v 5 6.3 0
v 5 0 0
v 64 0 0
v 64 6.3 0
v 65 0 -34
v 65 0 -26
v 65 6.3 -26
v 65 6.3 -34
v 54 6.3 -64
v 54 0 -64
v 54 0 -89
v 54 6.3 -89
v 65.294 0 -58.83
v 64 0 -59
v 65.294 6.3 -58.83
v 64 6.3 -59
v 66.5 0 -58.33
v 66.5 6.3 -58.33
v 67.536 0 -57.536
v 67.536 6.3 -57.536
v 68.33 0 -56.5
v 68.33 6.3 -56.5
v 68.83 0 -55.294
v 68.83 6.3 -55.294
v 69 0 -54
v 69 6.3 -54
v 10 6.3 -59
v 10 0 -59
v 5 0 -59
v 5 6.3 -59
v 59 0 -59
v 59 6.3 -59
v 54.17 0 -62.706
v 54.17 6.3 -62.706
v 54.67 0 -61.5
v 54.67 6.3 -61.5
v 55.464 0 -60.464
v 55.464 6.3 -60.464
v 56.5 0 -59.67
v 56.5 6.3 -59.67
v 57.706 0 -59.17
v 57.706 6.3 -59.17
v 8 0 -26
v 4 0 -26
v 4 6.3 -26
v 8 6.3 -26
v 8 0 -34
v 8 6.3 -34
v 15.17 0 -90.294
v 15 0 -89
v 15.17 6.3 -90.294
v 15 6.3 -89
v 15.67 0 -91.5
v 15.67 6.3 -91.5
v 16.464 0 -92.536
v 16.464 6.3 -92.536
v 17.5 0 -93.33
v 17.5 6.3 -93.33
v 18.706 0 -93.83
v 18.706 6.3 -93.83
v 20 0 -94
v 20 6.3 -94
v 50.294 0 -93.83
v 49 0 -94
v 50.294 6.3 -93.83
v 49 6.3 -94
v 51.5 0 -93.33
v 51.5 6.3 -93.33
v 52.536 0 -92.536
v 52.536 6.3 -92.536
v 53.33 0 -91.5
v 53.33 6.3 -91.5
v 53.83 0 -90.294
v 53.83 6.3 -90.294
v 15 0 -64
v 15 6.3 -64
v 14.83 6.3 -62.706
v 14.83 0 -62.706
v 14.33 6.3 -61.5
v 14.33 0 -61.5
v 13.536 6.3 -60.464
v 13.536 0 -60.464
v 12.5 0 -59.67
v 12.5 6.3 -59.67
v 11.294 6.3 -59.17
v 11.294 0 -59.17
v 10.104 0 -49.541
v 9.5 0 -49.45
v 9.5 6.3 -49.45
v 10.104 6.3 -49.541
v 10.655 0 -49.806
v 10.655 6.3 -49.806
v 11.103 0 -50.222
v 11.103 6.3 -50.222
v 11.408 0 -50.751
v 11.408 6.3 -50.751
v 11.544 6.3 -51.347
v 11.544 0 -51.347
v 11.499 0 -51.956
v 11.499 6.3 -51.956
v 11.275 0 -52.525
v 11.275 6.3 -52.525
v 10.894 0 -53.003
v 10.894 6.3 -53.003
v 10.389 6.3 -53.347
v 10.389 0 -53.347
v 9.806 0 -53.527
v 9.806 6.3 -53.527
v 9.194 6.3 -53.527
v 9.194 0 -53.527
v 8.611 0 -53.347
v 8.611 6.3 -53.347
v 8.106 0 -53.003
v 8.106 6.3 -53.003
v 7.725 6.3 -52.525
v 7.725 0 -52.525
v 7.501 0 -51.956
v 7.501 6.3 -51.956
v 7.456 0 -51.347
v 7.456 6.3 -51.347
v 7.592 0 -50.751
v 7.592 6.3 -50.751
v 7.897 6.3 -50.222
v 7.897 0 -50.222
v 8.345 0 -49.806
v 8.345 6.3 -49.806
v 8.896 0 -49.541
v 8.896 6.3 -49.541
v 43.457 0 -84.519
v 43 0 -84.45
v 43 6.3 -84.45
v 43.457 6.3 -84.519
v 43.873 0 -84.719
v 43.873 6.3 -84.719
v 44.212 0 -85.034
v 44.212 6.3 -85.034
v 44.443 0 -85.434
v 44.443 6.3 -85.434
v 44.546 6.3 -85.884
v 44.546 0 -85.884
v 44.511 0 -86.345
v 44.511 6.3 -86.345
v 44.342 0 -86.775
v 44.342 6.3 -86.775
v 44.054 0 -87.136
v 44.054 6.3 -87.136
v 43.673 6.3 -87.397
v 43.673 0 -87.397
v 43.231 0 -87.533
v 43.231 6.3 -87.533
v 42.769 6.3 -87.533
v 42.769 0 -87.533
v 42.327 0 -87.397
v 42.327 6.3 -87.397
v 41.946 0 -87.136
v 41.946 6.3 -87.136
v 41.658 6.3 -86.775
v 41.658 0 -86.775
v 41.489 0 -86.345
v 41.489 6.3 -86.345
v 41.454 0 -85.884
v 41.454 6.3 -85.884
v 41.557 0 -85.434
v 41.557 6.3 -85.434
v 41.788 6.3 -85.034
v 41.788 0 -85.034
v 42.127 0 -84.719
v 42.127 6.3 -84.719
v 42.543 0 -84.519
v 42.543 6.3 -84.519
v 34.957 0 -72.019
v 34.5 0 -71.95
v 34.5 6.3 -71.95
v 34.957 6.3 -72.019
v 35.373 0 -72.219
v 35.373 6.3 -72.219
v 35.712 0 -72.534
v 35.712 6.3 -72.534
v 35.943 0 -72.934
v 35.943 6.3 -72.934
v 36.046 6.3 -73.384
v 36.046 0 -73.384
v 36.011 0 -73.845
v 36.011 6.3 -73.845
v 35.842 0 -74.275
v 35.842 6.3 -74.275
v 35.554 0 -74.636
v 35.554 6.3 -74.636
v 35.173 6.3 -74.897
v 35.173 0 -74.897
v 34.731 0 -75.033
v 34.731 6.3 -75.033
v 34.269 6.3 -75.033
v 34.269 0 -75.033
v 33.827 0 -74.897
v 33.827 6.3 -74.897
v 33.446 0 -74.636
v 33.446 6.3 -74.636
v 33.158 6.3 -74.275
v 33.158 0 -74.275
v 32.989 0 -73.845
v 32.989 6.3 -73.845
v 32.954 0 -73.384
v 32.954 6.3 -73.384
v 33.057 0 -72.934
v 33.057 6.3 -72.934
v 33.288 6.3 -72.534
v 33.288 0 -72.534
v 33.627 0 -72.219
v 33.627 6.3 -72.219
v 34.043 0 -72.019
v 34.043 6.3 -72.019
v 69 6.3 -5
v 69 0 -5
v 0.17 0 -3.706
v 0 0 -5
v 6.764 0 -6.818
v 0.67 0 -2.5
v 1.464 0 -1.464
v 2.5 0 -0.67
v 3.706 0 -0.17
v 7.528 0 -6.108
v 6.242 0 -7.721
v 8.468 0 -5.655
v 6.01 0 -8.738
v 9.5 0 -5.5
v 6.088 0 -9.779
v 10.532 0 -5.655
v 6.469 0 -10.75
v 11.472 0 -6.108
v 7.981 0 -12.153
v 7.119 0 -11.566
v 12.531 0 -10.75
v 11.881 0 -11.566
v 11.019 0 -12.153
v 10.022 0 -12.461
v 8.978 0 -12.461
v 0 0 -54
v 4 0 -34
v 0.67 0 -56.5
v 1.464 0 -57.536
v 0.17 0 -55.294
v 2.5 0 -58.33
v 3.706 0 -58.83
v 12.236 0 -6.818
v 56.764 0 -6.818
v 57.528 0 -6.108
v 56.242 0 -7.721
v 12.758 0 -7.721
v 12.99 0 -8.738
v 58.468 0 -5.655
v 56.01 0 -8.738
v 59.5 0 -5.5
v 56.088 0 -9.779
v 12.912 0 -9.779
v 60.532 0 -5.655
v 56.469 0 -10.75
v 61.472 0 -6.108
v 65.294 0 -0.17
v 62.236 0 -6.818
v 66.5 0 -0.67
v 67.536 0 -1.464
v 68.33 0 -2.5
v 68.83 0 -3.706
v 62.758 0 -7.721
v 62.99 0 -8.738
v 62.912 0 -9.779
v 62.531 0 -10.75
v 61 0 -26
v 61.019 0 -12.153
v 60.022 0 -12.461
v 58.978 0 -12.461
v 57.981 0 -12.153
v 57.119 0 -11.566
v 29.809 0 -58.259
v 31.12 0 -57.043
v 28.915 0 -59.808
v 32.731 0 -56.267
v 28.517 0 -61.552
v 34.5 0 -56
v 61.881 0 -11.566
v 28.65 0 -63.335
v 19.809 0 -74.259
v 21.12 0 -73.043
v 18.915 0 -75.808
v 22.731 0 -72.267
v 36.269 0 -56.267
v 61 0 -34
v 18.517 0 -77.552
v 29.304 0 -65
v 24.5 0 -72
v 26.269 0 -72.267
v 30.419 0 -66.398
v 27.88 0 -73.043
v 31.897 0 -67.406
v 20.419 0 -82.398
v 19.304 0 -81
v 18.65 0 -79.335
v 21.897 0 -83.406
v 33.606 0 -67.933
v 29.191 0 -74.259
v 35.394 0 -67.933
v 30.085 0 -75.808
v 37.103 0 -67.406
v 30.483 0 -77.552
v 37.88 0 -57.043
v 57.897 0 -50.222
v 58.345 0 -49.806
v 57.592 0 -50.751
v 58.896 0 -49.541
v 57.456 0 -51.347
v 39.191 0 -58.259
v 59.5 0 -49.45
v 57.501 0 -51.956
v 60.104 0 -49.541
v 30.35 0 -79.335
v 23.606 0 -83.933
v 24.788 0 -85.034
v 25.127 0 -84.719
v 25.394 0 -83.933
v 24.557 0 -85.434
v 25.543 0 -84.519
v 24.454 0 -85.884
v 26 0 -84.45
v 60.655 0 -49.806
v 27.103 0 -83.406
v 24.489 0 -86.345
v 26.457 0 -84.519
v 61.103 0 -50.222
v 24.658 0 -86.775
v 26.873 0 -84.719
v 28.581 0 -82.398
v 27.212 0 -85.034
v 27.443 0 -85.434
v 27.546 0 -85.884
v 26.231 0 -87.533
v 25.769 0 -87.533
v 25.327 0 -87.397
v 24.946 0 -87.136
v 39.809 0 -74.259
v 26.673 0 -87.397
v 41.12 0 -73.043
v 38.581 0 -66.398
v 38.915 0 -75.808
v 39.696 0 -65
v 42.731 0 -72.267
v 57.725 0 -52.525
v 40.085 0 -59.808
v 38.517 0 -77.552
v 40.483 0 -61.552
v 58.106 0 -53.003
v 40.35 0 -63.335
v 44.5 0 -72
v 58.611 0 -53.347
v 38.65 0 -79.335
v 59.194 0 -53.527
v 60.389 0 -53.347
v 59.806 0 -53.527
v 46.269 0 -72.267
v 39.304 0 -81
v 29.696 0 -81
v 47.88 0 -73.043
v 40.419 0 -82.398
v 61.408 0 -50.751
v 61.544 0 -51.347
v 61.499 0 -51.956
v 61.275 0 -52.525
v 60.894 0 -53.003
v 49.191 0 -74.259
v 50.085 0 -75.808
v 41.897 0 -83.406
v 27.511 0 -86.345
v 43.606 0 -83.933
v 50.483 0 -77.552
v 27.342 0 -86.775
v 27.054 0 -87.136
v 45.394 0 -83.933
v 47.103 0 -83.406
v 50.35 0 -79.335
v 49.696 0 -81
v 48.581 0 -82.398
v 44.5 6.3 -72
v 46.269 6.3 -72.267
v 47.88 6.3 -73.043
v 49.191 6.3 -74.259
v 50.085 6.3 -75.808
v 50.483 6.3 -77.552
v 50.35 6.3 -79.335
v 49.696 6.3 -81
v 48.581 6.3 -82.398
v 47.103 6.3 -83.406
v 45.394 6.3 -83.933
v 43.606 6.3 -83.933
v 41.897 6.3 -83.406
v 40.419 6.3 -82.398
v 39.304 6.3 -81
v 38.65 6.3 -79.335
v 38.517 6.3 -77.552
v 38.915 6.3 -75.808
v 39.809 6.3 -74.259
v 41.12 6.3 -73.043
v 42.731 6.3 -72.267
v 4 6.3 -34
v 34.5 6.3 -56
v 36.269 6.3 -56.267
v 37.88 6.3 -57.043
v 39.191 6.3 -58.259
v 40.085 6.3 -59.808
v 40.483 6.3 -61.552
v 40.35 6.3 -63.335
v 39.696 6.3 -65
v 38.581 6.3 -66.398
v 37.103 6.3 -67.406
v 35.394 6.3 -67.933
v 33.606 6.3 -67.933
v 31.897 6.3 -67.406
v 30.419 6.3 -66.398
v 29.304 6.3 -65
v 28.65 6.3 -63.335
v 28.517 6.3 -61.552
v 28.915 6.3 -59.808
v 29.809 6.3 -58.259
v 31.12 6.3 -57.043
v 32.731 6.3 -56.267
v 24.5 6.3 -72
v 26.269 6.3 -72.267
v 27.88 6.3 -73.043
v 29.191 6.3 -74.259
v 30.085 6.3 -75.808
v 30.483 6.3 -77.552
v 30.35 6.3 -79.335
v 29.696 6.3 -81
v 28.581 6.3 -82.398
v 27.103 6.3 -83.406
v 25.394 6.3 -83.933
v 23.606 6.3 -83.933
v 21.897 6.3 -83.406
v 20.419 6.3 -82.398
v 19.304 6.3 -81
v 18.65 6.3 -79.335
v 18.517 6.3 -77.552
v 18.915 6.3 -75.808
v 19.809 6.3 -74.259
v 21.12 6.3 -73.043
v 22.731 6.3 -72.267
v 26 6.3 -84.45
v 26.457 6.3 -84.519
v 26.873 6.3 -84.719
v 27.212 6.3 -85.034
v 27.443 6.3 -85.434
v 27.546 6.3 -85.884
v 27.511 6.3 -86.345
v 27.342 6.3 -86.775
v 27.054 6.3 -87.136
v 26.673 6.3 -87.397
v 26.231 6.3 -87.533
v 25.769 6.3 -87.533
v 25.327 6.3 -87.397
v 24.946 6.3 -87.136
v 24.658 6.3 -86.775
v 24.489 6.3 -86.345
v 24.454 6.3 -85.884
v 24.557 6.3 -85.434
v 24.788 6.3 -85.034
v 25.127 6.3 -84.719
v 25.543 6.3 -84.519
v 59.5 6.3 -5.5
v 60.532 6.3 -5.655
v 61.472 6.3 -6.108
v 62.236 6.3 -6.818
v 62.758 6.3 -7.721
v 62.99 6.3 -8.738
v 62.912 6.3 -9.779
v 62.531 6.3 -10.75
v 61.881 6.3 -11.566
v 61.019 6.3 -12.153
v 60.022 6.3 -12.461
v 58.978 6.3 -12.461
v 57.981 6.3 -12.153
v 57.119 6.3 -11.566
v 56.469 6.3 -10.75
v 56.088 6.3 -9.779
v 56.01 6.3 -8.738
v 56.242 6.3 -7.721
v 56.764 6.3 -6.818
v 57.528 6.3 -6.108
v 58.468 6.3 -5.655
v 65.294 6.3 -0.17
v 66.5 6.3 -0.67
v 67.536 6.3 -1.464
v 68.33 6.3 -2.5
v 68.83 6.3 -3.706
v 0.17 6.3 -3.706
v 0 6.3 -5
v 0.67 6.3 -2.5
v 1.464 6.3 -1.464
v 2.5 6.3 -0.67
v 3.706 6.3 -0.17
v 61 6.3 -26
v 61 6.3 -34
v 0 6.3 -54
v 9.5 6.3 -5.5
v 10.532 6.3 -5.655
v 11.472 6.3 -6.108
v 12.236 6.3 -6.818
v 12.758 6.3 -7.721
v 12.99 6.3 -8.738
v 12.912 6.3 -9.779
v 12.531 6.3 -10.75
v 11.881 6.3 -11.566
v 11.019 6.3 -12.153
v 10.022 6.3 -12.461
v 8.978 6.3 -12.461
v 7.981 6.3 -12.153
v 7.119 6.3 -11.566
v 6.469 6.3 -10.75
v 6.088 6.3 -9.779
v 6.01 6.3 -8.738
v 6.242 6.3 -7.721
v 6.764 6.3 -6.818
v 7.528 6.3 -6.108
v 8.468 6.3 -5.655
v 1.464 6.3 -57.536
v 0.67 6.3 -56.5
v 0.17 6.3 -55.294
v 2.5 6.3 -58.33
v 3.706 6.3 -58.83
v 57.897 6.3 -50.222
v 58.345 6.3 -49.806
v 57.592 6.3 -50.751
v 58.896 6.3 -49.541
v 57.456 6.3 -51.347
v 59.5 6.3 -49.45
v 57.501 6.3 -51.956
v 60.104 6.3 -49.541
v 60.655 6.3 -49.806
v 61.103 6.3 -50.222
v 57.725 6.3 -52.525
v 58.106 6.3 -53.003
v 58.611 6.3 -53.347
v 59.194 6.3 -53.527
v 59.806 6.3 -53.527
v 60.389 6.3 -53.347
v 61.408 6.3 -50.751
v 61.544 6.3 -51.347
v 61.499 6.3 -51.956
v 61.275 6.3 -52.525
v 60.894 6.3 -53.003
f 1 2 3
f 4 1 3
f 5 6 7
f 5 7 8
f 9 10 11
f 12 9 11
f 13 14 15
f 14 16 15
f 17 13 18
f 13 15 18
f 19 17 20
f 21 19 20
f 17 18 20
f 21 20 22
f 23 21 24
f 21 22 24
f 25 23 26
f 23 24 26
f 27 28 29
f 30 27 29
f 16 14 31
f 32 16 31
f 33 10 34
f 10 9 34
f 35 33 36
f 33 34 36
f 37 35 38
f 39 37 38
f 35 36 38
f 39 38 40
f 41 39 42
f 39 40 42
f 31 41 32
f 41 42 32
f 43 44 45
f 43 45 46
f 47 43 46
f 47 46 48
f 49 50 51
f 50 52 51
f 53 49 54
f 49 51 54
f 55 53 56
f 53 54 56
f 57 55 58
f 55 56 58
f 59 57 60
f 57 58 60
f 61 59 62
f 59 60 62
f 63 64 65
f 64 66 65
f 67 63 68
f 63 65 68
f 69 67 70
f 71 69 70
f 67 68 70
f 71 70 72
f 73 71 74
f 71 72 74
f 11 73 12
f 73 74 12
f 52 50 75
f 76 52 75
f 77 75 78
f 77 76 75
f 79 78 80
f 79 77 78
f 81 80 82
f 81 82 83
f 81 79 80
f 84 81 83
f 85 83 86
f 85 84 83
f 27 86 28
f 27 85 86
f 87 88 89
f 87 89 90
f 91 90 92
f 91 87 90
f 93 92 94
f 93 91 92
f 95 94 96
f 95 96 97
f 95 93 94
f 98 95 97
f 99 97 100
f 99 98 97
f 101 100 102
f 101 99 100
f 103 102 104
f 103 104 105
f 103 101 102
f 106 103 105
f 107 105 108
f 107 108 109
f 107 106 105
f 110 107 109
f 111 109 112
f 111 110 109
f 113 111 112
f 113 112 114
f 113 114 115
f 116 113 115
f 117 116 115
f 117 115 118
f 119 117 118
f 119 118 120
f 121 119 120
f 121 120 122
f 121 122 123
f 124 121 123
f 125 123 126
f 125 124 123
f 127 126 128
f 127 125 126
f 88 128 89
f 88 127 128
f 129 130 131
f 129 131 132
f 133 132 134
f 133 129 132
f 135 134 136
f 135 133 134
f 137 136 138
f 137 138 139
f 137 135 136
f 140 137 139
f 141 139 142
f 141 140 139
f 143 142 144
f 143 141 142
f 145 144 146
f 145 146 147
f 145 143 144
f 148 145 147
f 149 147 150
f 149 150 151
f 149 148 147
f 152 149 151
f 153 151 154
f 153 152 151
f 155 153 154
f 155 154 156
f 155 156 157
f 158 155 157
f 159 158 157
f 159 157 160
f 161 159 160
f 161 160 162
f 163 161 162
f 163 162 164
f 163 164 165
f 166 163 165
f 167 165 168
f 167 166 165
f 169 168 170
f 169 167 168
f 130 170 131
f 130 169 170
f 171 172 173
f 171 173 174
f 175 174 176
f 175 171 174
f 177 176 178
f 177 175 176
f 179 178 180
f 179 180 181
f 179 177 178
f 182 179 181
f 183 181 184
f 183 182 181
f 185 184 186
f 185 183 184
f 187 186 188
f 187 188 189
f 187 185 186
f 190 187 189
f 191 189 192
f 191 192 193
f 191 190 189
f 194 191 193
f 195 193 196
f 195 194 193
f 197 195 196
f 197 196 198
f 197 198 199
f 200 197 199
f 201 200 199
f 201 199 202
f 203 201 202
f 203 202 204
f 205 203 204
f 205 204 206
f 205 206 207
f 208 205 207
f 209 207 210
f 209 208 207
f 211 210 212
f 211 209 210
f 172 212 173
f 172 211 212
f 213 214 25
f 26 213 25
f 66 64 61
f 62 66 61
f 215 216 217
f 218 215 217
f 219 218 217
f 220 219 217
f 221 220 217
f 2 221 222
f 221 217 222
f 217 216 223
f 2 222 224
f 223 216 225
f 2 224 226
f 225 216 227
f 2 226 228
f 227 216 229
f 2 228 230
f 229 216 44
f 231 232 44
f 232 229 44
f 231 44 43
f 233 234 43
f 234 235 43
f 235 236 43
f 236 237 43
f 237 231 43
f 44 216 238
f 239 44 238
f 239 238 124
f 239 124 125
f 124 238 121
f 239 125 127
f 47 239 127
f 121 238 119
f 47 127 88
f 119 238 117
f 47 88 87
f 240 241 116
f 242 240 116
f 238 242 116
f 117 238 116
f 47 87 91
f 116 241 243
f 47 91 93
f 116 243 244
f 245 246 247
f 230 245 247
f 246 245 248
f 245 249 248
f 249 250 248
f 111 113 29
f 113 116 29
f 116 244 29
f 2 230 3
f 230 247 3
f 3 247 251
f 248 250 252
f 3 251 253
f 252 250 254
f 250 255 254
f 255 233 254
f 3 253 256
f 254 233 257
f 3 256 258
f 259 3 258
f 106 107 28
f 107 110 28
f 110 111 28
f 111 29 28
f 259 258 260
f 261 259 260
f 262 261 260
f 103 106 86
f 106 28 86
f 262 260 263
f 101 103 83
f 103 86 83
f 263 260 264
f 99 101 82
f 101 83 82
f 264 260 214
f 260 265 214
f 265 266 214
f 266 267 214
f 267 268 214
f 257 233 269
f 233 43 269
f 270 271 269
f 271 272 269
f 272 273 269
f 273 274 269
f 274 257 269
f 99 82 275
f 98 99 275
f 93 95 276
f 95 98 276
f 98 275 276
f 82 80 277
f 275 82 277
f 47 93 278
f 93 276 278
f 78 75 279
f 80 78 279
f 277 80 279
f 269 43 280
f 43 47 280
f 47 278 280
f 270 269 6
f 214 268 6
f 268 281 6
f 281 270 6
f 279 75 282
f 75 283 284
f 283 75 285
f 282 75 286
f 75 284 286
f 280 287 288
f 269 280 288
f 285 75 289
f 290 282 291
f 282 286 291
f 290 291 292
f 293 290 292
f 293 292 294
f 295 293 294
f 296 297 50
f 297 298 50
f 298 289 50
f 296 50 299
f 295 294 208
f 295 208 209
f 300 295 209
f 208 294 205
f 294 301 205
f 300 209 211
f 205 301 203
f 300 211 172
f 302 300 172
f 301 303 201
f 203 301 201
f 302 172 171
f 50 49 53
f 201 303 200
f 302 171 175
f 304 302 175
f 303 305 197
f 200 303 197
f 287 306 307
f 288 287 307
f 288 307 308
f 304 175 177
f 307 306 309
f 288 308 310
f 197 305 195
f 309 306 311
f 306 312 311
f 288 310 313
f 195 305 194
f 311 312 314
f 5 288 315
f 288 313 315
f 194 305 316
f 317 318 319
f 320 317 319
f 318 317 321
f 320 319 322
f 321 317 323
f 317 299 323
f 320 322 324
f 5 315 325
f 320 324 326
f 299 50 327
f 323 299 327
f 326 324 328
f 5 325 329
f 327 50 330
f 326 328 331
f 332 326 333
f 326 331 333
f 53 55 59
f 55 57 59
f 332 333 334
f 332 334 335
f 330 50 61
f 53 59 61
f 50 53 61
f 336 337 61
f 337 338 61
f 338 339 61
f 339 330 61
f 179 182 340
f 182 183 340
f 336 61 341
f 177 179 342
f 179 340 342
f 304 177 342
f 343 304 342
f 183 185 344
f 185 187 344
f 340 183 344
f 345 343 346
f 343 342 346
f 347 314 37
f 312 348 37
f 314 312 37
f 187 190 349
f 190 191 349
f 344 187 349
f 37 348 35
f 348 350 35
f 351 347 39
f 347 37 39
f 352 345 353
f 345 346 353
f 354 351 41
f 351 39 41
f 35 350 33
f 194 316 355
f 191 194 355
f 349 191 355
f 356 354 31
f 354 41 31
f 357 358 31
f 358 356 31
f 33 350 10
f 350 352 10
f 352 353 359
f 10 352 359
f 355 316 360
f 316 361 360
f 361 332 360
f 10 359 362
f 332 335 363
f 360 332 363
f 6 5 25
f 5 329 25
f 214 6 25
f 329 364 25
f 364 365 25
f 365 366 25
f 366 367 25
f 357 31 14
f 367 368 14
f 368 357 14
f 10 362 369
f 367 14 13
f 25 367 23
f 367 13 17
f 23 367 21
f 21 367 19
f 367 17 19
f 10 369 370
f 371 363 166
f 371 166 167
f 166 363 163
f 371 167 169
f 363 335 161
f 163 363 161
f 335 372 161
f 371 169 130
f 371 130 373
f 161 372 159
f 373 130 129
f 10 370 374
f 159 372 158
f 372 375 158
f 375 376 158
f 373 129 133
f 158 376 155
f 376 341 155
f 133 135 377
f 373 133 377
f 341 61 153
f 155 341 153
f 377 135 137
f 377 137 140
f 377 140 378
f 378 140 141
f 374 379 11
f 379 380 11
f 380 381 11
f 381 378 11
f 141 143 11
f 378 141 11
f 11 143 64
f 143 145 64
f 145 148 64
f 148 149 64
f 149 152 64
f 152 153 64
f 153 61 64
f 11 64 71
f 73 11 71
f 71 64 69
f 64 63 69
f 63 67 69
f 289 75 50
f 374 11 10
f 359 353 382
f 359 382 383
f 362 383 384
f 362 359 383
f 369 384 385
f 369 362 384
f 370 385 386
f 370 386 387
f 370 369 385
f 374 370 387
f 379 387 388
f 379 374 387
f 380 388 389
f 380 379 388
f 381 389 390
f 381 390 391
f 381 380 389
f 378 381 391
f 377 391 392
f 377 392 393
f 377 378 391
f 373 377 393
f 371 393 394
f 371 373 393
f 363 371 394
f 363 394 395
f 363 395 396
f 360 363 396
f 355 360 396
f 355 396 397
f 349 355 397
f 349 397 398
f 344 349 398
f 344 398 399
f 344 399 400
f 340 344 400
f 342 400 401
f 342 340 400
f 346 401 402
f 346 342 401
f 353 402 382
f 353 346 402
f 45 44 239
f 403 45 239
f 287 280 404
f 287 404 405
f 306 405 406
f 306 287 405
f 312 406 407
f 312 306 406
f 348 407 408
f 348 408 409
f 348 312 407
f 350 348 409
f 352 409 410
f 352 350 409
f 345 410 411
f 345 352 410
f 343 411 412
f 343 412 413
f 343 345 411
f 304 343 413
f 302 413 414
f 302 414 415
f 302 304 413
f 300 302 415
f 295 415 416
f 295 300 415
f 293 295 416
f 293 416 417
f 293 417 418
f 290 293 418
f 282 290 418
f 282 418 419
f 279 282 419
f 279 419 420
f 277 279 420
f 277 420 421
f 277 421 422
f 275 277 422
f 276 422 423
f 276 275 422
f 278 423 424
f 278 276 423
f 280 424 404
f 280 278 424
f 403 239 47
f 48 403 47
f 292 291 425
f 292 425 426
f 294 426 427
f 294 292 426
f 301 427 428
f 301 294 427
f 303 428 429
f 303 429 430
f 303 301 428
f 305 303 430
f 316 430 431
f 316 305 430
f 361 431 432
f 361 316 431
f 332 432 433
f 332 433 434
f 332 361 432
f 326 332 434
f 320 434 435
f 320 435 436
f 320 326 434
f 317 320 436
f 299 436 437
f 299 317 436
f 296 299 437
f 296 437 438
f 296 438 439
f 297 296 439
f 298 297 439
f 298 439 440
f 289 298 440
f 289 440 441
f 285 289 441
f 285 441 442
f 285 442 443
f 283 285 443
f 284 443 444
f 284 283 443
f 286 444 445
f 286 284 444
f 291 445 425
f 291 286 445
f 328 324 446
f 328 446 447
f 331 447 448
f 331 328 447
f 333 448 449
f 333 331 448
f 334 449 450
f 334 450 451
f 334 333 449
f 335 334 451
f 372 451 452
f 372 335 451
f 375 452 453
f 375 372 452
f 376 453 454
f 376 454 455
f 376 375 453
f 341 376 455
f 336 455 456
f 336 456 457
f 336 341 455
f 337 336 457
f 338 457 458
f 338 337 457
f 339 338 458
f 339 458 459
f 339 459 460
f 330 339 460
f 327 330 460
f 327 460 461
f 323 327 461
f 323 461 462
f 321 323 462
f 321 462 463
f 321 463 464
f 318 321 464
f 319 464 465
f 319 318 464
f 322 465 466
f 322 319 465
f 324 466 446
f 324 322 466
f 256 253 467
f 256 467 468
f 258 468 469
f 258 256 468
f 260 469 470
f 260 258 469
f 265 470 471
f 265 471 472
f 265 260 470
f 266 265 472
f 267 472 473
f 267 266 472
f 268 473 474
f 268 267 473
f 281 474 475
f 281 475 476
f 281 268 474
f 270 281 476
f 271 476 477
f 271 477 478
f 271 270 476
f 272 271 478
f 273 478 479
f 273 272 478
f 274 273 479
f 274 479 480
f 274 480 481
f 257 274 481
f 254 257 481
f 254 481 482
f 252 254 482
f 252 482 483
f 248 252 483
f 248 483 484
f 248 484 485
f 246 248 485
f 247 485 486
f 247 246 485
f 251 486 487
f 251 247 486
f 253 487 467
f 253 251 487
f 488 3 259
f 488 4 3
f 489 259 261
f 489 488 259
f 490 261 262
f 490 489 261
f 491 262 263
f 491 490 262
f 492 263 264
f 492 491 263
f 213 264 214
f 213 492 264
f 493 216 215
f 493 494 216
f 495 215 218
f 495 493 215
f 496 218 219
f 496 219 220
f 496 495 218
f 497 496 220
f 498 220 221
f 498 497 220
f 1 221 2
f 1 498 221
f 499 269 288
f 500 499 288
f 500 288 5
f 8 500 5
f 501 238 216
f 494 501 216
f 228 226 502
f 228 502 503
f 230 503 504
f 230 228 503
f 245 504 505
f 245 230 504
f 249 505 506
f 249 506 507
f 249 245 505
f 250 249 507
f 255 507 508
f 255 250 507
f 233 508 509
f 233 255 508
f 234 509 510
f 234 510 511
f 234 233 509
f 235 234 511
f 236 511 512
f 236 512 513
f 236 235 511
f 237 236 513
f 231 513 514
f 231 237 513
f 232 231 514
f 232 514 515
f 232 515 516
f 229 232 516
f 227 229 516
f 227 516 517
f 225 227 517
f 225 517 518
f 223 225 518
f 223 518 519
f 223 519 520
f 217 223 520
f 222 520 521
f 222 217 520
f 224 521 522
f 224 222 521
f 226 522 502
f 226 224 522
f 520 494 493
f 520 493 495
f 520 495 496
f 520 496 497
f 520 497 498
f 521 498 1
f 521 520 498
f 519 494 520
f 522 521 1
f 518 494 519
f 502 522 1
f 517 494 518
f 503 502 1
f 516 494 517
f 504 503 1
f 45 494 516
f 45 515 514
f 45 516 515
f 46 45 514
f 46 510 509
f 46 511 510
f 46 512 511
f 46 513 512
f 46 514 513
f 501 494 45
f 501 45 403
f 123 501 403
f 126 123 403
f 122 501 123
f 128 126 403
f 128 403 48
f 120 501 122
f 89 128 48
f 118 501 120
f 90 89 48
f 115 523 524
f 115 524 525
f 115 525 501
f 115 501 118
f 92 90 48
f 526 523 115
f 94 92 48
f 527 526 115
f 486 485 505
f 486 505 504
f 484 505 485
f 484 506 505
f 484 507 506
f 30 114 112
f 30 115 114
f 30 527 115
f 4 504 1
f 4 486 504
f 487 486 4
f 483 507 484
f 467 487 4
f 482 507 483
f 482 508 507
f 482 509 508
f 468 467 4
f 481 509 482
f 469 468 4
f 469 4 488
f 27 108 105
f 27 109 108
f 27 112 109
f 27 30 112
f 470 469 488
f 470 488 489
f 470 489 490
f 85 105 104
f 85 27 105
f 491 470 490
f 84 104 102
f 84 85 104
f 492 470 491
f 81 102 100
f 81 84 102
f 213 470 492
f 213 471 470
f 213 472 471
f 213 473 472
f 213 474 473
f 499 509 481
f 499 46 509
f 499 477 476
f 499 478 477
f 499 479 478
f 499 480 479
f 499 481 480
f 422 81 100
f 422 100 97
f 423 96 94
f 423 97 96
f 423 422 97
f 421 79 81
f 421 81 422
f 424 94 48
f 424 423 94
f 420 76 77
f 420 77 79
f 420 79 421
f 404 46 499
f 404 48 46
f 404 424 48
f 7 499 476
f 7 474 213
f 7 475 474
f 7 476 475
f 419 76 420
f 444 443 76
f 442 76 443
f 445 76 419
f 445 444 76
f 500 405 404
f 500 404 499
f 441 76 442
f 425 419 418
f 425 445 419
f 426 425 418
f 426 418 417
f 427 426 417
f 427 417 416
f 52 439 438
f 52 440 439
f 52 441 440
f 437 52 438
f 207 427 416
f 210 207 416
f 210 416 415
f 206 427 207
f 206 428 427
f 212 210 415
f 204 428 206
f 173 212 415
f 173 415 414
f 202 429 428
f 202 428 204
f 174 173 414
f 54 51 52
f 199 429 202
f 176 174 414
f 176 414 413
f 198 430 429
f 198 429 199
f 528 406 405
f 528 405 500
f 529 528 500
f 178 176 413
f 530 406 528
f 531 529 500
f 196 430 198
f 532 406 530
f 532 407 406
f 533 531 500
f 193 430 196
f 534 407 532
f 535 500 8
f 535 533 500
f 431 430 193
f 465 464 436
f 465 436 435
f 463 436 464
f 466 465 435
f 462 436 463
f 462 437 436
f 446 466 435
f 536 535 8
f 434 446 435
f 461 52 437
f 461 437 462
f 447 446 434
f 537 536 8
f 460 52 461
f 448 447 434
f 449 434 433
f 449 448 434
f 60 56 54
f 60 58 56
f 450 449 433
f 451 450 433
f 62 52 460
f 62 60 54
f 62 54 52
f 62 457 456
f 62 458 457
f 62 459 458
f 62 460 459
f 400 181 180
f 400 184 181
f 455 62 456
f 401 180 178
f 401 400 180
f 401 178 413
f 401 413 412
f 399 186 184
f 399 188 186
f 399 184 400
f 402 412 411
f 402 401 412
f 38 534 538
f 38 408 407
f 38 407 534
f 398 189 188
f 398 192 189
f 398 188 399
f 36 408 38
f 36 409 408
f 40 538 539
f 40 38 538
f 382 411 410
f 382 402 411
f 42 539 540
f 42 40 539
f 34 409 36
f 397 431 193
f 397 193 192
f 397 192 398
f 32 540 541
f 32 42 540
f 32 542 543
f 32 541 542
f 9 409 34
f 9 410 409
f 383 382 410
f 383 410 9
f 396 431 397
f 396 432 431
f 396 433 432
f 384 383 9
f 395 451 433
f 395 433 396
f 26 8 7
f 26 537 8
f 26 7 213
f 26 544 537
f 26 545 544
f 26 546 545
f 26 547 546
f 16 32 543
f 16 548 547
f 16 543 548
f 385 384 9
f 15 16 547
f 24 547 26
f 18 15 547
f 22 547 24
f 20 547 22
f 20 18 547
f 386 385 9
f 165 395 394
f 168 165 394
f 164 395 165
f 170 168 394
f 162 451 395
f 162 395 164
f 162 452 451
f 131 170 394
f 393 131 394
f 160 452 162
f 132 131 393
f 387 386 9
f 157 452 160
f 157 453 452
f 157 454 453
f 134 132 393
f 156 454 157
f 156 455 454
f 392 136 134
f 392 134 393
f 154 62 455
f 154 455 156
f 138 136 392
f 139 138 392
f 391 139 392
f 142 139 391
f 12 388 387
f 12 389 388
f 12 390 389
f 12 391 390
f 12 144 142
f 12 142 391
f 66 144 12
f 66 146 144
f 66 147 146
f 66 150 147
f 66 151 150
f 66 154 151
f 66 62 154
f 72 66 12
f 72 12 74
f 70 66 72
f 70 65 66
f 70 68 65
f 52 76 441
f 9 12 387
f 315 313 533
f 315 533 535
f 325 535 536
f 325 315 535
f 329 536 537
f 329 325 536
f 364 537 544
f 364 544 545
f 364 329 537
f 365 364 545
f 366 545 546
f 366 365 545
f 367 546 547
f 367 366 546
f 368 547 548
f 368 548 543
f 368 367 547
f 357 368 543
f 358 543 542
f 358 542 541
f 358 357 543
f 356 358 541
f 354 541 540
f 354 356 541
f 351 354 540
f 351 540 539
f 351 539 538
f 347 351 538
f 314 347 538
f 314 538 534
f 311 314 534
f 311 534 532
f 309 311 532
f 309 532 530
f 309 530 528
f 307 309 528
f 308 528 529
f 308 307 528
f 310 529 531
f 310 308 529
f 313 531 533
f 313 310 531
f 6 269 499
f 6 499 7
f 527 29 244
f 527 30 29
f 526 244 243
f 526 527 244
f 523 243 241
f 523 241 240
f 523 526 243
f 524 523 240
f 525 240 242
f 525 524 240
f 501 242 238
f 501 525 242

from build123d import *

# Parameters (mm, degrees)
SKETCH1_R           = 2.05
SKETCH1_R_2         = 3.5
SKETCH1_R_3         = 6
SKETCH1_R_4         = 1.55
SKETCH1_W           = 4
SKETCH1_H           = 8
BOSS_EXTRUDE1_DEPTH = 6.3
FILLET1_R           = 5


with BuildPart() as part:
    # Sketch1 → Boss-Extrude1 (new body)
    with BuildSketch(Plane(origin=(0, 0, 0), x_dir=(1, 0, 0), z_dir=(0, 1, 0))):
        Polygon((15, 94), (15, 59), (0, 59), (0, 0), (69, 0), (69, 59), (54, 59), (54, 94), align=None)
        with Locations(Location((9.5, 51.5, 0), (0, 0, 270))):
            Circle(SKETCH1_R, mode=Mode.SUBTRACT)
        with Locations(Location((59.5, 51.5, 0), (0, 0, 270))):
            Circle(SKETCH1_R, mode=Mode.SUBTRACT)
        with Locations(Location((9.5, 9, 0), (0, 0, 270))):
            Circle(SKETCH1_R_2, mode=Mode.SUBTRACT)
        with Locations(Location((59.5, 9, 0), (0, 0, 270))):
            Circle(SKETCH1_R_2, mode=Mode.SUBTRACT)
        with Locations(Location((24.5, 78, 0), (0, 0, 270))):
            Circle(SKETCH1_R_3, mode=Mode.SUBTRACT)
        with Locations(Location((44.5, 78, 0), (0, 0, 270))):
            Circle(SKETCH1_R_3, mode=Mode.SUBTRACT)
        with Locations(Location((34.5, 62, 0), (0, 0, 270))):
            Circle(SKETCH1_R_3, mode=Mode.SUBTRACT)
        with Locations(Location((34.5, 73.5, 0), (0, 0, 270))):
            Circle(SKETCH1_R_4, mode=Mode.SUBTRACT)
        with Locations(Location((26, 86, 0), (0, 0, 270))):
            Circle(SKETCH1_R_4, mode=Mode.SUBTRACT)
        with Locations(Location((43, 86, 0), (0, 0, 270))):
            Circle(SKETCH1_R_4, mode=Mode.SUBTRACT)
        with Locations((6, 30)):
            Rectangle(SKETCH1_W, SKETCH1_H, mode=Mode.SUBTRACT)
        with Locations((63, 30)):
            Rectangle(SKETCH1_W, SKETCH1_H, mode=Mode.SUBTRACT)
    extrude(amount=BOSS_EXTRUDE1_DEPTH)

    # Fillet1
    fillet1_edges = [part.edges().sort_by_distance(p)[0] for p in [
        (0, 3.15, -59),
        (15, 3.15, -59),
        (15, 3.15, -94),
        (54, 3.15, -94),
        (54, 3.15, -59),
        (69, 3.15, -59),
        (69, 3.15, 0),
        (0, 3.15, 0),
    ]]
    fillet(fillet1_edges, radius=FILLET1_R)


solid = part.part
